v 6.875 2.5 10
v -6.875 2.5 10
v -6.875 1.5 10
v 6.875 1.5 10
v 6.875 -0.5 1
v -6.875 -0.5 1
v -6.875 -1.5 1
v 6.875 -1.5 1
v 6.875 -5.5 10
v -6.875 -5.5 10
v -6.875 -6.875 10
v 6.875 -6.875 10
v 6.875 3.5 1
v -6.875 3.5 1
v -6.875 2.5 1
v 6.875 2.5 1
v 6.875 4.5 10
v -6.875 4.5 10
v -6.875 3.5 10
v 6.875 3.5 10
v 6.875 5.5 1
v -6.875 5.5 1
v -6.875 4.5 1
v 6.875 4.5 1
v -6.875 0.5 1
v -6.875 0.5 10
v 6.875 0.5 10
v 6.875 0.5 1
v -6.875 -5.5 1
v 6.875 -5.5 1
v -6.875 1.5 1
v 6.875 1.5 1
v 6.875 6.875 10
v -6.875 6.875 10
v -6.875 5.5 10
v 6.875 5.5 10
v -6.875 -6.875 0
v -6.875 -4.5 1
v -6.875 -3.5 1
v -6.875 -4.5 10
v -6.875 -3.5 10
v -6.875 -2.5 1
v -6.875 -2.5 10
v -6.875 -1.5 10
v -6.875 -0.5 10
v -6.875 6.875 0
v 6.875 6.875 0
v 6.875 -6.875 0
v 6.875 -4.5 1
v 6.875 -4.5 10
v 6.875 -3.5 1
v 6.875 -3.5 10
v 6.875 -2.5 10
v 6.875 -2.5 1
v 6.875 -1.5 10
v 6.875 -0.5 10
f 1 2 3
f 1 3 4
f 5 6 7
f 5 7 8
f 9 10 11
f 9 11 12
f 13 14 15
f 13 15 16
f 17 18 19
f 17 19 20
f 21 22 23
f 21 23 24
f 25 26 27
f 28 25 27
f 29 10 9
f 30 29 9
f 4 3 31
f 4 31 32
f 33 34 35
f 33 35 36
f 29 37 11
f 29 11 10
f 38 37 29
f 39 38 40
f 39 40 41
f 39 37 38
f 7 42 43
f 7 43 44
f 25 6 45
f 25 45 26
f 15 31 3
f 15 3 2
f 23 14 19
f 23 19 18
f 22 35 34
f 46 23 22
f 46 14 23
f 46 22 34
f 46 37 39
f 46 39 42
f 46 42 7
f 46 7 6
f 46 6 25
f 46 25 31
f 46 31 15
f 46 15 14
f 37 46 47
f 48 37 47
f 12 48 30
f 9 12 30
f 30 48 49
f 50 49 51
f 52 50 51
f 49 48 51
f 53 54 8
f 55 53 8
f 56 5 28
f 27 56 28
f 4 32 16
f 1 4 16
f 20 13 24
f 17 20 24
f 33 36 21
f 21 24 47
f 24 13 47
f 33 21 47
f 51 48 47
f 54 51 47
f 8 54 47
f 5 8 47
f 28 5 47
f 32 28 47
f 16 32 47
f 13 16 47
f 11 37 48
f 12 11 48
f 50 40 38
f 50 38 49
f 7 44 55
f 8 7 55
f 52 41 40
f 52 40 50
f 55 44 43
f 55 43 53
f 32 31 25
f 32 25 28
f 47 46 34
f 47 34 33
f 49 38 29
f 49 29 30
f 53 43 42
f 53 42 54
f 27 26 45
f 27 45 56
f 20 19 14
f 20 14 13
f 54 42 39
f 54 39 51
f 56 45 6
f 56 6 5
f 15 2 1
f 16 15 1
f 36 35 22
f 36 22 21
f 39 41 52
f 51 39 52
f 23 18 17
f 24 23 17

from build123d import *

# Parameters (mm, degrees)
SKETCH072_W            = 13.75
SKETCH072_H            = 13.75
PAD039_DEPTH           = 10
SKETCH073_W            = 20
SKETCH073_H            = 1
POCKET034_DEPTH        = 9
LINEARPATTERN001_COUNT = 6
LINEARPATTERN001_PITCH = 2


with BuildPart() as part:
    # Sketch072 → Pad039 (new body)
    with BuildSketch(Plane.XY):
        Rectangle(SKETCH072_W, SKETCH072_H)
    extrude(amount=PAD039_DEPTH)

    # Sketch073 → Pocket034 (cut)
    with BuildSketch(Plane(origin=(0, -5, 10), x_dir=(1, 0, 0), z_dir=(0, 0, 1))):
        Rectangle(SKETCH073_W, SKETCH073_H)
    pocket034 = extrude(amount=-POCKET034_DEPTH, mode=Mode.SUBTRACT)

    # LinearPattern001: Pocket034 ×6
    with Locations(*[(0, i * LINEARPATTERN001_PITCH, 0) for i in range(1, LINEARPATTERN001_COUNT)]):
        add(pocket034, mode=Mode.SUBTRACT)


solid = part.part
